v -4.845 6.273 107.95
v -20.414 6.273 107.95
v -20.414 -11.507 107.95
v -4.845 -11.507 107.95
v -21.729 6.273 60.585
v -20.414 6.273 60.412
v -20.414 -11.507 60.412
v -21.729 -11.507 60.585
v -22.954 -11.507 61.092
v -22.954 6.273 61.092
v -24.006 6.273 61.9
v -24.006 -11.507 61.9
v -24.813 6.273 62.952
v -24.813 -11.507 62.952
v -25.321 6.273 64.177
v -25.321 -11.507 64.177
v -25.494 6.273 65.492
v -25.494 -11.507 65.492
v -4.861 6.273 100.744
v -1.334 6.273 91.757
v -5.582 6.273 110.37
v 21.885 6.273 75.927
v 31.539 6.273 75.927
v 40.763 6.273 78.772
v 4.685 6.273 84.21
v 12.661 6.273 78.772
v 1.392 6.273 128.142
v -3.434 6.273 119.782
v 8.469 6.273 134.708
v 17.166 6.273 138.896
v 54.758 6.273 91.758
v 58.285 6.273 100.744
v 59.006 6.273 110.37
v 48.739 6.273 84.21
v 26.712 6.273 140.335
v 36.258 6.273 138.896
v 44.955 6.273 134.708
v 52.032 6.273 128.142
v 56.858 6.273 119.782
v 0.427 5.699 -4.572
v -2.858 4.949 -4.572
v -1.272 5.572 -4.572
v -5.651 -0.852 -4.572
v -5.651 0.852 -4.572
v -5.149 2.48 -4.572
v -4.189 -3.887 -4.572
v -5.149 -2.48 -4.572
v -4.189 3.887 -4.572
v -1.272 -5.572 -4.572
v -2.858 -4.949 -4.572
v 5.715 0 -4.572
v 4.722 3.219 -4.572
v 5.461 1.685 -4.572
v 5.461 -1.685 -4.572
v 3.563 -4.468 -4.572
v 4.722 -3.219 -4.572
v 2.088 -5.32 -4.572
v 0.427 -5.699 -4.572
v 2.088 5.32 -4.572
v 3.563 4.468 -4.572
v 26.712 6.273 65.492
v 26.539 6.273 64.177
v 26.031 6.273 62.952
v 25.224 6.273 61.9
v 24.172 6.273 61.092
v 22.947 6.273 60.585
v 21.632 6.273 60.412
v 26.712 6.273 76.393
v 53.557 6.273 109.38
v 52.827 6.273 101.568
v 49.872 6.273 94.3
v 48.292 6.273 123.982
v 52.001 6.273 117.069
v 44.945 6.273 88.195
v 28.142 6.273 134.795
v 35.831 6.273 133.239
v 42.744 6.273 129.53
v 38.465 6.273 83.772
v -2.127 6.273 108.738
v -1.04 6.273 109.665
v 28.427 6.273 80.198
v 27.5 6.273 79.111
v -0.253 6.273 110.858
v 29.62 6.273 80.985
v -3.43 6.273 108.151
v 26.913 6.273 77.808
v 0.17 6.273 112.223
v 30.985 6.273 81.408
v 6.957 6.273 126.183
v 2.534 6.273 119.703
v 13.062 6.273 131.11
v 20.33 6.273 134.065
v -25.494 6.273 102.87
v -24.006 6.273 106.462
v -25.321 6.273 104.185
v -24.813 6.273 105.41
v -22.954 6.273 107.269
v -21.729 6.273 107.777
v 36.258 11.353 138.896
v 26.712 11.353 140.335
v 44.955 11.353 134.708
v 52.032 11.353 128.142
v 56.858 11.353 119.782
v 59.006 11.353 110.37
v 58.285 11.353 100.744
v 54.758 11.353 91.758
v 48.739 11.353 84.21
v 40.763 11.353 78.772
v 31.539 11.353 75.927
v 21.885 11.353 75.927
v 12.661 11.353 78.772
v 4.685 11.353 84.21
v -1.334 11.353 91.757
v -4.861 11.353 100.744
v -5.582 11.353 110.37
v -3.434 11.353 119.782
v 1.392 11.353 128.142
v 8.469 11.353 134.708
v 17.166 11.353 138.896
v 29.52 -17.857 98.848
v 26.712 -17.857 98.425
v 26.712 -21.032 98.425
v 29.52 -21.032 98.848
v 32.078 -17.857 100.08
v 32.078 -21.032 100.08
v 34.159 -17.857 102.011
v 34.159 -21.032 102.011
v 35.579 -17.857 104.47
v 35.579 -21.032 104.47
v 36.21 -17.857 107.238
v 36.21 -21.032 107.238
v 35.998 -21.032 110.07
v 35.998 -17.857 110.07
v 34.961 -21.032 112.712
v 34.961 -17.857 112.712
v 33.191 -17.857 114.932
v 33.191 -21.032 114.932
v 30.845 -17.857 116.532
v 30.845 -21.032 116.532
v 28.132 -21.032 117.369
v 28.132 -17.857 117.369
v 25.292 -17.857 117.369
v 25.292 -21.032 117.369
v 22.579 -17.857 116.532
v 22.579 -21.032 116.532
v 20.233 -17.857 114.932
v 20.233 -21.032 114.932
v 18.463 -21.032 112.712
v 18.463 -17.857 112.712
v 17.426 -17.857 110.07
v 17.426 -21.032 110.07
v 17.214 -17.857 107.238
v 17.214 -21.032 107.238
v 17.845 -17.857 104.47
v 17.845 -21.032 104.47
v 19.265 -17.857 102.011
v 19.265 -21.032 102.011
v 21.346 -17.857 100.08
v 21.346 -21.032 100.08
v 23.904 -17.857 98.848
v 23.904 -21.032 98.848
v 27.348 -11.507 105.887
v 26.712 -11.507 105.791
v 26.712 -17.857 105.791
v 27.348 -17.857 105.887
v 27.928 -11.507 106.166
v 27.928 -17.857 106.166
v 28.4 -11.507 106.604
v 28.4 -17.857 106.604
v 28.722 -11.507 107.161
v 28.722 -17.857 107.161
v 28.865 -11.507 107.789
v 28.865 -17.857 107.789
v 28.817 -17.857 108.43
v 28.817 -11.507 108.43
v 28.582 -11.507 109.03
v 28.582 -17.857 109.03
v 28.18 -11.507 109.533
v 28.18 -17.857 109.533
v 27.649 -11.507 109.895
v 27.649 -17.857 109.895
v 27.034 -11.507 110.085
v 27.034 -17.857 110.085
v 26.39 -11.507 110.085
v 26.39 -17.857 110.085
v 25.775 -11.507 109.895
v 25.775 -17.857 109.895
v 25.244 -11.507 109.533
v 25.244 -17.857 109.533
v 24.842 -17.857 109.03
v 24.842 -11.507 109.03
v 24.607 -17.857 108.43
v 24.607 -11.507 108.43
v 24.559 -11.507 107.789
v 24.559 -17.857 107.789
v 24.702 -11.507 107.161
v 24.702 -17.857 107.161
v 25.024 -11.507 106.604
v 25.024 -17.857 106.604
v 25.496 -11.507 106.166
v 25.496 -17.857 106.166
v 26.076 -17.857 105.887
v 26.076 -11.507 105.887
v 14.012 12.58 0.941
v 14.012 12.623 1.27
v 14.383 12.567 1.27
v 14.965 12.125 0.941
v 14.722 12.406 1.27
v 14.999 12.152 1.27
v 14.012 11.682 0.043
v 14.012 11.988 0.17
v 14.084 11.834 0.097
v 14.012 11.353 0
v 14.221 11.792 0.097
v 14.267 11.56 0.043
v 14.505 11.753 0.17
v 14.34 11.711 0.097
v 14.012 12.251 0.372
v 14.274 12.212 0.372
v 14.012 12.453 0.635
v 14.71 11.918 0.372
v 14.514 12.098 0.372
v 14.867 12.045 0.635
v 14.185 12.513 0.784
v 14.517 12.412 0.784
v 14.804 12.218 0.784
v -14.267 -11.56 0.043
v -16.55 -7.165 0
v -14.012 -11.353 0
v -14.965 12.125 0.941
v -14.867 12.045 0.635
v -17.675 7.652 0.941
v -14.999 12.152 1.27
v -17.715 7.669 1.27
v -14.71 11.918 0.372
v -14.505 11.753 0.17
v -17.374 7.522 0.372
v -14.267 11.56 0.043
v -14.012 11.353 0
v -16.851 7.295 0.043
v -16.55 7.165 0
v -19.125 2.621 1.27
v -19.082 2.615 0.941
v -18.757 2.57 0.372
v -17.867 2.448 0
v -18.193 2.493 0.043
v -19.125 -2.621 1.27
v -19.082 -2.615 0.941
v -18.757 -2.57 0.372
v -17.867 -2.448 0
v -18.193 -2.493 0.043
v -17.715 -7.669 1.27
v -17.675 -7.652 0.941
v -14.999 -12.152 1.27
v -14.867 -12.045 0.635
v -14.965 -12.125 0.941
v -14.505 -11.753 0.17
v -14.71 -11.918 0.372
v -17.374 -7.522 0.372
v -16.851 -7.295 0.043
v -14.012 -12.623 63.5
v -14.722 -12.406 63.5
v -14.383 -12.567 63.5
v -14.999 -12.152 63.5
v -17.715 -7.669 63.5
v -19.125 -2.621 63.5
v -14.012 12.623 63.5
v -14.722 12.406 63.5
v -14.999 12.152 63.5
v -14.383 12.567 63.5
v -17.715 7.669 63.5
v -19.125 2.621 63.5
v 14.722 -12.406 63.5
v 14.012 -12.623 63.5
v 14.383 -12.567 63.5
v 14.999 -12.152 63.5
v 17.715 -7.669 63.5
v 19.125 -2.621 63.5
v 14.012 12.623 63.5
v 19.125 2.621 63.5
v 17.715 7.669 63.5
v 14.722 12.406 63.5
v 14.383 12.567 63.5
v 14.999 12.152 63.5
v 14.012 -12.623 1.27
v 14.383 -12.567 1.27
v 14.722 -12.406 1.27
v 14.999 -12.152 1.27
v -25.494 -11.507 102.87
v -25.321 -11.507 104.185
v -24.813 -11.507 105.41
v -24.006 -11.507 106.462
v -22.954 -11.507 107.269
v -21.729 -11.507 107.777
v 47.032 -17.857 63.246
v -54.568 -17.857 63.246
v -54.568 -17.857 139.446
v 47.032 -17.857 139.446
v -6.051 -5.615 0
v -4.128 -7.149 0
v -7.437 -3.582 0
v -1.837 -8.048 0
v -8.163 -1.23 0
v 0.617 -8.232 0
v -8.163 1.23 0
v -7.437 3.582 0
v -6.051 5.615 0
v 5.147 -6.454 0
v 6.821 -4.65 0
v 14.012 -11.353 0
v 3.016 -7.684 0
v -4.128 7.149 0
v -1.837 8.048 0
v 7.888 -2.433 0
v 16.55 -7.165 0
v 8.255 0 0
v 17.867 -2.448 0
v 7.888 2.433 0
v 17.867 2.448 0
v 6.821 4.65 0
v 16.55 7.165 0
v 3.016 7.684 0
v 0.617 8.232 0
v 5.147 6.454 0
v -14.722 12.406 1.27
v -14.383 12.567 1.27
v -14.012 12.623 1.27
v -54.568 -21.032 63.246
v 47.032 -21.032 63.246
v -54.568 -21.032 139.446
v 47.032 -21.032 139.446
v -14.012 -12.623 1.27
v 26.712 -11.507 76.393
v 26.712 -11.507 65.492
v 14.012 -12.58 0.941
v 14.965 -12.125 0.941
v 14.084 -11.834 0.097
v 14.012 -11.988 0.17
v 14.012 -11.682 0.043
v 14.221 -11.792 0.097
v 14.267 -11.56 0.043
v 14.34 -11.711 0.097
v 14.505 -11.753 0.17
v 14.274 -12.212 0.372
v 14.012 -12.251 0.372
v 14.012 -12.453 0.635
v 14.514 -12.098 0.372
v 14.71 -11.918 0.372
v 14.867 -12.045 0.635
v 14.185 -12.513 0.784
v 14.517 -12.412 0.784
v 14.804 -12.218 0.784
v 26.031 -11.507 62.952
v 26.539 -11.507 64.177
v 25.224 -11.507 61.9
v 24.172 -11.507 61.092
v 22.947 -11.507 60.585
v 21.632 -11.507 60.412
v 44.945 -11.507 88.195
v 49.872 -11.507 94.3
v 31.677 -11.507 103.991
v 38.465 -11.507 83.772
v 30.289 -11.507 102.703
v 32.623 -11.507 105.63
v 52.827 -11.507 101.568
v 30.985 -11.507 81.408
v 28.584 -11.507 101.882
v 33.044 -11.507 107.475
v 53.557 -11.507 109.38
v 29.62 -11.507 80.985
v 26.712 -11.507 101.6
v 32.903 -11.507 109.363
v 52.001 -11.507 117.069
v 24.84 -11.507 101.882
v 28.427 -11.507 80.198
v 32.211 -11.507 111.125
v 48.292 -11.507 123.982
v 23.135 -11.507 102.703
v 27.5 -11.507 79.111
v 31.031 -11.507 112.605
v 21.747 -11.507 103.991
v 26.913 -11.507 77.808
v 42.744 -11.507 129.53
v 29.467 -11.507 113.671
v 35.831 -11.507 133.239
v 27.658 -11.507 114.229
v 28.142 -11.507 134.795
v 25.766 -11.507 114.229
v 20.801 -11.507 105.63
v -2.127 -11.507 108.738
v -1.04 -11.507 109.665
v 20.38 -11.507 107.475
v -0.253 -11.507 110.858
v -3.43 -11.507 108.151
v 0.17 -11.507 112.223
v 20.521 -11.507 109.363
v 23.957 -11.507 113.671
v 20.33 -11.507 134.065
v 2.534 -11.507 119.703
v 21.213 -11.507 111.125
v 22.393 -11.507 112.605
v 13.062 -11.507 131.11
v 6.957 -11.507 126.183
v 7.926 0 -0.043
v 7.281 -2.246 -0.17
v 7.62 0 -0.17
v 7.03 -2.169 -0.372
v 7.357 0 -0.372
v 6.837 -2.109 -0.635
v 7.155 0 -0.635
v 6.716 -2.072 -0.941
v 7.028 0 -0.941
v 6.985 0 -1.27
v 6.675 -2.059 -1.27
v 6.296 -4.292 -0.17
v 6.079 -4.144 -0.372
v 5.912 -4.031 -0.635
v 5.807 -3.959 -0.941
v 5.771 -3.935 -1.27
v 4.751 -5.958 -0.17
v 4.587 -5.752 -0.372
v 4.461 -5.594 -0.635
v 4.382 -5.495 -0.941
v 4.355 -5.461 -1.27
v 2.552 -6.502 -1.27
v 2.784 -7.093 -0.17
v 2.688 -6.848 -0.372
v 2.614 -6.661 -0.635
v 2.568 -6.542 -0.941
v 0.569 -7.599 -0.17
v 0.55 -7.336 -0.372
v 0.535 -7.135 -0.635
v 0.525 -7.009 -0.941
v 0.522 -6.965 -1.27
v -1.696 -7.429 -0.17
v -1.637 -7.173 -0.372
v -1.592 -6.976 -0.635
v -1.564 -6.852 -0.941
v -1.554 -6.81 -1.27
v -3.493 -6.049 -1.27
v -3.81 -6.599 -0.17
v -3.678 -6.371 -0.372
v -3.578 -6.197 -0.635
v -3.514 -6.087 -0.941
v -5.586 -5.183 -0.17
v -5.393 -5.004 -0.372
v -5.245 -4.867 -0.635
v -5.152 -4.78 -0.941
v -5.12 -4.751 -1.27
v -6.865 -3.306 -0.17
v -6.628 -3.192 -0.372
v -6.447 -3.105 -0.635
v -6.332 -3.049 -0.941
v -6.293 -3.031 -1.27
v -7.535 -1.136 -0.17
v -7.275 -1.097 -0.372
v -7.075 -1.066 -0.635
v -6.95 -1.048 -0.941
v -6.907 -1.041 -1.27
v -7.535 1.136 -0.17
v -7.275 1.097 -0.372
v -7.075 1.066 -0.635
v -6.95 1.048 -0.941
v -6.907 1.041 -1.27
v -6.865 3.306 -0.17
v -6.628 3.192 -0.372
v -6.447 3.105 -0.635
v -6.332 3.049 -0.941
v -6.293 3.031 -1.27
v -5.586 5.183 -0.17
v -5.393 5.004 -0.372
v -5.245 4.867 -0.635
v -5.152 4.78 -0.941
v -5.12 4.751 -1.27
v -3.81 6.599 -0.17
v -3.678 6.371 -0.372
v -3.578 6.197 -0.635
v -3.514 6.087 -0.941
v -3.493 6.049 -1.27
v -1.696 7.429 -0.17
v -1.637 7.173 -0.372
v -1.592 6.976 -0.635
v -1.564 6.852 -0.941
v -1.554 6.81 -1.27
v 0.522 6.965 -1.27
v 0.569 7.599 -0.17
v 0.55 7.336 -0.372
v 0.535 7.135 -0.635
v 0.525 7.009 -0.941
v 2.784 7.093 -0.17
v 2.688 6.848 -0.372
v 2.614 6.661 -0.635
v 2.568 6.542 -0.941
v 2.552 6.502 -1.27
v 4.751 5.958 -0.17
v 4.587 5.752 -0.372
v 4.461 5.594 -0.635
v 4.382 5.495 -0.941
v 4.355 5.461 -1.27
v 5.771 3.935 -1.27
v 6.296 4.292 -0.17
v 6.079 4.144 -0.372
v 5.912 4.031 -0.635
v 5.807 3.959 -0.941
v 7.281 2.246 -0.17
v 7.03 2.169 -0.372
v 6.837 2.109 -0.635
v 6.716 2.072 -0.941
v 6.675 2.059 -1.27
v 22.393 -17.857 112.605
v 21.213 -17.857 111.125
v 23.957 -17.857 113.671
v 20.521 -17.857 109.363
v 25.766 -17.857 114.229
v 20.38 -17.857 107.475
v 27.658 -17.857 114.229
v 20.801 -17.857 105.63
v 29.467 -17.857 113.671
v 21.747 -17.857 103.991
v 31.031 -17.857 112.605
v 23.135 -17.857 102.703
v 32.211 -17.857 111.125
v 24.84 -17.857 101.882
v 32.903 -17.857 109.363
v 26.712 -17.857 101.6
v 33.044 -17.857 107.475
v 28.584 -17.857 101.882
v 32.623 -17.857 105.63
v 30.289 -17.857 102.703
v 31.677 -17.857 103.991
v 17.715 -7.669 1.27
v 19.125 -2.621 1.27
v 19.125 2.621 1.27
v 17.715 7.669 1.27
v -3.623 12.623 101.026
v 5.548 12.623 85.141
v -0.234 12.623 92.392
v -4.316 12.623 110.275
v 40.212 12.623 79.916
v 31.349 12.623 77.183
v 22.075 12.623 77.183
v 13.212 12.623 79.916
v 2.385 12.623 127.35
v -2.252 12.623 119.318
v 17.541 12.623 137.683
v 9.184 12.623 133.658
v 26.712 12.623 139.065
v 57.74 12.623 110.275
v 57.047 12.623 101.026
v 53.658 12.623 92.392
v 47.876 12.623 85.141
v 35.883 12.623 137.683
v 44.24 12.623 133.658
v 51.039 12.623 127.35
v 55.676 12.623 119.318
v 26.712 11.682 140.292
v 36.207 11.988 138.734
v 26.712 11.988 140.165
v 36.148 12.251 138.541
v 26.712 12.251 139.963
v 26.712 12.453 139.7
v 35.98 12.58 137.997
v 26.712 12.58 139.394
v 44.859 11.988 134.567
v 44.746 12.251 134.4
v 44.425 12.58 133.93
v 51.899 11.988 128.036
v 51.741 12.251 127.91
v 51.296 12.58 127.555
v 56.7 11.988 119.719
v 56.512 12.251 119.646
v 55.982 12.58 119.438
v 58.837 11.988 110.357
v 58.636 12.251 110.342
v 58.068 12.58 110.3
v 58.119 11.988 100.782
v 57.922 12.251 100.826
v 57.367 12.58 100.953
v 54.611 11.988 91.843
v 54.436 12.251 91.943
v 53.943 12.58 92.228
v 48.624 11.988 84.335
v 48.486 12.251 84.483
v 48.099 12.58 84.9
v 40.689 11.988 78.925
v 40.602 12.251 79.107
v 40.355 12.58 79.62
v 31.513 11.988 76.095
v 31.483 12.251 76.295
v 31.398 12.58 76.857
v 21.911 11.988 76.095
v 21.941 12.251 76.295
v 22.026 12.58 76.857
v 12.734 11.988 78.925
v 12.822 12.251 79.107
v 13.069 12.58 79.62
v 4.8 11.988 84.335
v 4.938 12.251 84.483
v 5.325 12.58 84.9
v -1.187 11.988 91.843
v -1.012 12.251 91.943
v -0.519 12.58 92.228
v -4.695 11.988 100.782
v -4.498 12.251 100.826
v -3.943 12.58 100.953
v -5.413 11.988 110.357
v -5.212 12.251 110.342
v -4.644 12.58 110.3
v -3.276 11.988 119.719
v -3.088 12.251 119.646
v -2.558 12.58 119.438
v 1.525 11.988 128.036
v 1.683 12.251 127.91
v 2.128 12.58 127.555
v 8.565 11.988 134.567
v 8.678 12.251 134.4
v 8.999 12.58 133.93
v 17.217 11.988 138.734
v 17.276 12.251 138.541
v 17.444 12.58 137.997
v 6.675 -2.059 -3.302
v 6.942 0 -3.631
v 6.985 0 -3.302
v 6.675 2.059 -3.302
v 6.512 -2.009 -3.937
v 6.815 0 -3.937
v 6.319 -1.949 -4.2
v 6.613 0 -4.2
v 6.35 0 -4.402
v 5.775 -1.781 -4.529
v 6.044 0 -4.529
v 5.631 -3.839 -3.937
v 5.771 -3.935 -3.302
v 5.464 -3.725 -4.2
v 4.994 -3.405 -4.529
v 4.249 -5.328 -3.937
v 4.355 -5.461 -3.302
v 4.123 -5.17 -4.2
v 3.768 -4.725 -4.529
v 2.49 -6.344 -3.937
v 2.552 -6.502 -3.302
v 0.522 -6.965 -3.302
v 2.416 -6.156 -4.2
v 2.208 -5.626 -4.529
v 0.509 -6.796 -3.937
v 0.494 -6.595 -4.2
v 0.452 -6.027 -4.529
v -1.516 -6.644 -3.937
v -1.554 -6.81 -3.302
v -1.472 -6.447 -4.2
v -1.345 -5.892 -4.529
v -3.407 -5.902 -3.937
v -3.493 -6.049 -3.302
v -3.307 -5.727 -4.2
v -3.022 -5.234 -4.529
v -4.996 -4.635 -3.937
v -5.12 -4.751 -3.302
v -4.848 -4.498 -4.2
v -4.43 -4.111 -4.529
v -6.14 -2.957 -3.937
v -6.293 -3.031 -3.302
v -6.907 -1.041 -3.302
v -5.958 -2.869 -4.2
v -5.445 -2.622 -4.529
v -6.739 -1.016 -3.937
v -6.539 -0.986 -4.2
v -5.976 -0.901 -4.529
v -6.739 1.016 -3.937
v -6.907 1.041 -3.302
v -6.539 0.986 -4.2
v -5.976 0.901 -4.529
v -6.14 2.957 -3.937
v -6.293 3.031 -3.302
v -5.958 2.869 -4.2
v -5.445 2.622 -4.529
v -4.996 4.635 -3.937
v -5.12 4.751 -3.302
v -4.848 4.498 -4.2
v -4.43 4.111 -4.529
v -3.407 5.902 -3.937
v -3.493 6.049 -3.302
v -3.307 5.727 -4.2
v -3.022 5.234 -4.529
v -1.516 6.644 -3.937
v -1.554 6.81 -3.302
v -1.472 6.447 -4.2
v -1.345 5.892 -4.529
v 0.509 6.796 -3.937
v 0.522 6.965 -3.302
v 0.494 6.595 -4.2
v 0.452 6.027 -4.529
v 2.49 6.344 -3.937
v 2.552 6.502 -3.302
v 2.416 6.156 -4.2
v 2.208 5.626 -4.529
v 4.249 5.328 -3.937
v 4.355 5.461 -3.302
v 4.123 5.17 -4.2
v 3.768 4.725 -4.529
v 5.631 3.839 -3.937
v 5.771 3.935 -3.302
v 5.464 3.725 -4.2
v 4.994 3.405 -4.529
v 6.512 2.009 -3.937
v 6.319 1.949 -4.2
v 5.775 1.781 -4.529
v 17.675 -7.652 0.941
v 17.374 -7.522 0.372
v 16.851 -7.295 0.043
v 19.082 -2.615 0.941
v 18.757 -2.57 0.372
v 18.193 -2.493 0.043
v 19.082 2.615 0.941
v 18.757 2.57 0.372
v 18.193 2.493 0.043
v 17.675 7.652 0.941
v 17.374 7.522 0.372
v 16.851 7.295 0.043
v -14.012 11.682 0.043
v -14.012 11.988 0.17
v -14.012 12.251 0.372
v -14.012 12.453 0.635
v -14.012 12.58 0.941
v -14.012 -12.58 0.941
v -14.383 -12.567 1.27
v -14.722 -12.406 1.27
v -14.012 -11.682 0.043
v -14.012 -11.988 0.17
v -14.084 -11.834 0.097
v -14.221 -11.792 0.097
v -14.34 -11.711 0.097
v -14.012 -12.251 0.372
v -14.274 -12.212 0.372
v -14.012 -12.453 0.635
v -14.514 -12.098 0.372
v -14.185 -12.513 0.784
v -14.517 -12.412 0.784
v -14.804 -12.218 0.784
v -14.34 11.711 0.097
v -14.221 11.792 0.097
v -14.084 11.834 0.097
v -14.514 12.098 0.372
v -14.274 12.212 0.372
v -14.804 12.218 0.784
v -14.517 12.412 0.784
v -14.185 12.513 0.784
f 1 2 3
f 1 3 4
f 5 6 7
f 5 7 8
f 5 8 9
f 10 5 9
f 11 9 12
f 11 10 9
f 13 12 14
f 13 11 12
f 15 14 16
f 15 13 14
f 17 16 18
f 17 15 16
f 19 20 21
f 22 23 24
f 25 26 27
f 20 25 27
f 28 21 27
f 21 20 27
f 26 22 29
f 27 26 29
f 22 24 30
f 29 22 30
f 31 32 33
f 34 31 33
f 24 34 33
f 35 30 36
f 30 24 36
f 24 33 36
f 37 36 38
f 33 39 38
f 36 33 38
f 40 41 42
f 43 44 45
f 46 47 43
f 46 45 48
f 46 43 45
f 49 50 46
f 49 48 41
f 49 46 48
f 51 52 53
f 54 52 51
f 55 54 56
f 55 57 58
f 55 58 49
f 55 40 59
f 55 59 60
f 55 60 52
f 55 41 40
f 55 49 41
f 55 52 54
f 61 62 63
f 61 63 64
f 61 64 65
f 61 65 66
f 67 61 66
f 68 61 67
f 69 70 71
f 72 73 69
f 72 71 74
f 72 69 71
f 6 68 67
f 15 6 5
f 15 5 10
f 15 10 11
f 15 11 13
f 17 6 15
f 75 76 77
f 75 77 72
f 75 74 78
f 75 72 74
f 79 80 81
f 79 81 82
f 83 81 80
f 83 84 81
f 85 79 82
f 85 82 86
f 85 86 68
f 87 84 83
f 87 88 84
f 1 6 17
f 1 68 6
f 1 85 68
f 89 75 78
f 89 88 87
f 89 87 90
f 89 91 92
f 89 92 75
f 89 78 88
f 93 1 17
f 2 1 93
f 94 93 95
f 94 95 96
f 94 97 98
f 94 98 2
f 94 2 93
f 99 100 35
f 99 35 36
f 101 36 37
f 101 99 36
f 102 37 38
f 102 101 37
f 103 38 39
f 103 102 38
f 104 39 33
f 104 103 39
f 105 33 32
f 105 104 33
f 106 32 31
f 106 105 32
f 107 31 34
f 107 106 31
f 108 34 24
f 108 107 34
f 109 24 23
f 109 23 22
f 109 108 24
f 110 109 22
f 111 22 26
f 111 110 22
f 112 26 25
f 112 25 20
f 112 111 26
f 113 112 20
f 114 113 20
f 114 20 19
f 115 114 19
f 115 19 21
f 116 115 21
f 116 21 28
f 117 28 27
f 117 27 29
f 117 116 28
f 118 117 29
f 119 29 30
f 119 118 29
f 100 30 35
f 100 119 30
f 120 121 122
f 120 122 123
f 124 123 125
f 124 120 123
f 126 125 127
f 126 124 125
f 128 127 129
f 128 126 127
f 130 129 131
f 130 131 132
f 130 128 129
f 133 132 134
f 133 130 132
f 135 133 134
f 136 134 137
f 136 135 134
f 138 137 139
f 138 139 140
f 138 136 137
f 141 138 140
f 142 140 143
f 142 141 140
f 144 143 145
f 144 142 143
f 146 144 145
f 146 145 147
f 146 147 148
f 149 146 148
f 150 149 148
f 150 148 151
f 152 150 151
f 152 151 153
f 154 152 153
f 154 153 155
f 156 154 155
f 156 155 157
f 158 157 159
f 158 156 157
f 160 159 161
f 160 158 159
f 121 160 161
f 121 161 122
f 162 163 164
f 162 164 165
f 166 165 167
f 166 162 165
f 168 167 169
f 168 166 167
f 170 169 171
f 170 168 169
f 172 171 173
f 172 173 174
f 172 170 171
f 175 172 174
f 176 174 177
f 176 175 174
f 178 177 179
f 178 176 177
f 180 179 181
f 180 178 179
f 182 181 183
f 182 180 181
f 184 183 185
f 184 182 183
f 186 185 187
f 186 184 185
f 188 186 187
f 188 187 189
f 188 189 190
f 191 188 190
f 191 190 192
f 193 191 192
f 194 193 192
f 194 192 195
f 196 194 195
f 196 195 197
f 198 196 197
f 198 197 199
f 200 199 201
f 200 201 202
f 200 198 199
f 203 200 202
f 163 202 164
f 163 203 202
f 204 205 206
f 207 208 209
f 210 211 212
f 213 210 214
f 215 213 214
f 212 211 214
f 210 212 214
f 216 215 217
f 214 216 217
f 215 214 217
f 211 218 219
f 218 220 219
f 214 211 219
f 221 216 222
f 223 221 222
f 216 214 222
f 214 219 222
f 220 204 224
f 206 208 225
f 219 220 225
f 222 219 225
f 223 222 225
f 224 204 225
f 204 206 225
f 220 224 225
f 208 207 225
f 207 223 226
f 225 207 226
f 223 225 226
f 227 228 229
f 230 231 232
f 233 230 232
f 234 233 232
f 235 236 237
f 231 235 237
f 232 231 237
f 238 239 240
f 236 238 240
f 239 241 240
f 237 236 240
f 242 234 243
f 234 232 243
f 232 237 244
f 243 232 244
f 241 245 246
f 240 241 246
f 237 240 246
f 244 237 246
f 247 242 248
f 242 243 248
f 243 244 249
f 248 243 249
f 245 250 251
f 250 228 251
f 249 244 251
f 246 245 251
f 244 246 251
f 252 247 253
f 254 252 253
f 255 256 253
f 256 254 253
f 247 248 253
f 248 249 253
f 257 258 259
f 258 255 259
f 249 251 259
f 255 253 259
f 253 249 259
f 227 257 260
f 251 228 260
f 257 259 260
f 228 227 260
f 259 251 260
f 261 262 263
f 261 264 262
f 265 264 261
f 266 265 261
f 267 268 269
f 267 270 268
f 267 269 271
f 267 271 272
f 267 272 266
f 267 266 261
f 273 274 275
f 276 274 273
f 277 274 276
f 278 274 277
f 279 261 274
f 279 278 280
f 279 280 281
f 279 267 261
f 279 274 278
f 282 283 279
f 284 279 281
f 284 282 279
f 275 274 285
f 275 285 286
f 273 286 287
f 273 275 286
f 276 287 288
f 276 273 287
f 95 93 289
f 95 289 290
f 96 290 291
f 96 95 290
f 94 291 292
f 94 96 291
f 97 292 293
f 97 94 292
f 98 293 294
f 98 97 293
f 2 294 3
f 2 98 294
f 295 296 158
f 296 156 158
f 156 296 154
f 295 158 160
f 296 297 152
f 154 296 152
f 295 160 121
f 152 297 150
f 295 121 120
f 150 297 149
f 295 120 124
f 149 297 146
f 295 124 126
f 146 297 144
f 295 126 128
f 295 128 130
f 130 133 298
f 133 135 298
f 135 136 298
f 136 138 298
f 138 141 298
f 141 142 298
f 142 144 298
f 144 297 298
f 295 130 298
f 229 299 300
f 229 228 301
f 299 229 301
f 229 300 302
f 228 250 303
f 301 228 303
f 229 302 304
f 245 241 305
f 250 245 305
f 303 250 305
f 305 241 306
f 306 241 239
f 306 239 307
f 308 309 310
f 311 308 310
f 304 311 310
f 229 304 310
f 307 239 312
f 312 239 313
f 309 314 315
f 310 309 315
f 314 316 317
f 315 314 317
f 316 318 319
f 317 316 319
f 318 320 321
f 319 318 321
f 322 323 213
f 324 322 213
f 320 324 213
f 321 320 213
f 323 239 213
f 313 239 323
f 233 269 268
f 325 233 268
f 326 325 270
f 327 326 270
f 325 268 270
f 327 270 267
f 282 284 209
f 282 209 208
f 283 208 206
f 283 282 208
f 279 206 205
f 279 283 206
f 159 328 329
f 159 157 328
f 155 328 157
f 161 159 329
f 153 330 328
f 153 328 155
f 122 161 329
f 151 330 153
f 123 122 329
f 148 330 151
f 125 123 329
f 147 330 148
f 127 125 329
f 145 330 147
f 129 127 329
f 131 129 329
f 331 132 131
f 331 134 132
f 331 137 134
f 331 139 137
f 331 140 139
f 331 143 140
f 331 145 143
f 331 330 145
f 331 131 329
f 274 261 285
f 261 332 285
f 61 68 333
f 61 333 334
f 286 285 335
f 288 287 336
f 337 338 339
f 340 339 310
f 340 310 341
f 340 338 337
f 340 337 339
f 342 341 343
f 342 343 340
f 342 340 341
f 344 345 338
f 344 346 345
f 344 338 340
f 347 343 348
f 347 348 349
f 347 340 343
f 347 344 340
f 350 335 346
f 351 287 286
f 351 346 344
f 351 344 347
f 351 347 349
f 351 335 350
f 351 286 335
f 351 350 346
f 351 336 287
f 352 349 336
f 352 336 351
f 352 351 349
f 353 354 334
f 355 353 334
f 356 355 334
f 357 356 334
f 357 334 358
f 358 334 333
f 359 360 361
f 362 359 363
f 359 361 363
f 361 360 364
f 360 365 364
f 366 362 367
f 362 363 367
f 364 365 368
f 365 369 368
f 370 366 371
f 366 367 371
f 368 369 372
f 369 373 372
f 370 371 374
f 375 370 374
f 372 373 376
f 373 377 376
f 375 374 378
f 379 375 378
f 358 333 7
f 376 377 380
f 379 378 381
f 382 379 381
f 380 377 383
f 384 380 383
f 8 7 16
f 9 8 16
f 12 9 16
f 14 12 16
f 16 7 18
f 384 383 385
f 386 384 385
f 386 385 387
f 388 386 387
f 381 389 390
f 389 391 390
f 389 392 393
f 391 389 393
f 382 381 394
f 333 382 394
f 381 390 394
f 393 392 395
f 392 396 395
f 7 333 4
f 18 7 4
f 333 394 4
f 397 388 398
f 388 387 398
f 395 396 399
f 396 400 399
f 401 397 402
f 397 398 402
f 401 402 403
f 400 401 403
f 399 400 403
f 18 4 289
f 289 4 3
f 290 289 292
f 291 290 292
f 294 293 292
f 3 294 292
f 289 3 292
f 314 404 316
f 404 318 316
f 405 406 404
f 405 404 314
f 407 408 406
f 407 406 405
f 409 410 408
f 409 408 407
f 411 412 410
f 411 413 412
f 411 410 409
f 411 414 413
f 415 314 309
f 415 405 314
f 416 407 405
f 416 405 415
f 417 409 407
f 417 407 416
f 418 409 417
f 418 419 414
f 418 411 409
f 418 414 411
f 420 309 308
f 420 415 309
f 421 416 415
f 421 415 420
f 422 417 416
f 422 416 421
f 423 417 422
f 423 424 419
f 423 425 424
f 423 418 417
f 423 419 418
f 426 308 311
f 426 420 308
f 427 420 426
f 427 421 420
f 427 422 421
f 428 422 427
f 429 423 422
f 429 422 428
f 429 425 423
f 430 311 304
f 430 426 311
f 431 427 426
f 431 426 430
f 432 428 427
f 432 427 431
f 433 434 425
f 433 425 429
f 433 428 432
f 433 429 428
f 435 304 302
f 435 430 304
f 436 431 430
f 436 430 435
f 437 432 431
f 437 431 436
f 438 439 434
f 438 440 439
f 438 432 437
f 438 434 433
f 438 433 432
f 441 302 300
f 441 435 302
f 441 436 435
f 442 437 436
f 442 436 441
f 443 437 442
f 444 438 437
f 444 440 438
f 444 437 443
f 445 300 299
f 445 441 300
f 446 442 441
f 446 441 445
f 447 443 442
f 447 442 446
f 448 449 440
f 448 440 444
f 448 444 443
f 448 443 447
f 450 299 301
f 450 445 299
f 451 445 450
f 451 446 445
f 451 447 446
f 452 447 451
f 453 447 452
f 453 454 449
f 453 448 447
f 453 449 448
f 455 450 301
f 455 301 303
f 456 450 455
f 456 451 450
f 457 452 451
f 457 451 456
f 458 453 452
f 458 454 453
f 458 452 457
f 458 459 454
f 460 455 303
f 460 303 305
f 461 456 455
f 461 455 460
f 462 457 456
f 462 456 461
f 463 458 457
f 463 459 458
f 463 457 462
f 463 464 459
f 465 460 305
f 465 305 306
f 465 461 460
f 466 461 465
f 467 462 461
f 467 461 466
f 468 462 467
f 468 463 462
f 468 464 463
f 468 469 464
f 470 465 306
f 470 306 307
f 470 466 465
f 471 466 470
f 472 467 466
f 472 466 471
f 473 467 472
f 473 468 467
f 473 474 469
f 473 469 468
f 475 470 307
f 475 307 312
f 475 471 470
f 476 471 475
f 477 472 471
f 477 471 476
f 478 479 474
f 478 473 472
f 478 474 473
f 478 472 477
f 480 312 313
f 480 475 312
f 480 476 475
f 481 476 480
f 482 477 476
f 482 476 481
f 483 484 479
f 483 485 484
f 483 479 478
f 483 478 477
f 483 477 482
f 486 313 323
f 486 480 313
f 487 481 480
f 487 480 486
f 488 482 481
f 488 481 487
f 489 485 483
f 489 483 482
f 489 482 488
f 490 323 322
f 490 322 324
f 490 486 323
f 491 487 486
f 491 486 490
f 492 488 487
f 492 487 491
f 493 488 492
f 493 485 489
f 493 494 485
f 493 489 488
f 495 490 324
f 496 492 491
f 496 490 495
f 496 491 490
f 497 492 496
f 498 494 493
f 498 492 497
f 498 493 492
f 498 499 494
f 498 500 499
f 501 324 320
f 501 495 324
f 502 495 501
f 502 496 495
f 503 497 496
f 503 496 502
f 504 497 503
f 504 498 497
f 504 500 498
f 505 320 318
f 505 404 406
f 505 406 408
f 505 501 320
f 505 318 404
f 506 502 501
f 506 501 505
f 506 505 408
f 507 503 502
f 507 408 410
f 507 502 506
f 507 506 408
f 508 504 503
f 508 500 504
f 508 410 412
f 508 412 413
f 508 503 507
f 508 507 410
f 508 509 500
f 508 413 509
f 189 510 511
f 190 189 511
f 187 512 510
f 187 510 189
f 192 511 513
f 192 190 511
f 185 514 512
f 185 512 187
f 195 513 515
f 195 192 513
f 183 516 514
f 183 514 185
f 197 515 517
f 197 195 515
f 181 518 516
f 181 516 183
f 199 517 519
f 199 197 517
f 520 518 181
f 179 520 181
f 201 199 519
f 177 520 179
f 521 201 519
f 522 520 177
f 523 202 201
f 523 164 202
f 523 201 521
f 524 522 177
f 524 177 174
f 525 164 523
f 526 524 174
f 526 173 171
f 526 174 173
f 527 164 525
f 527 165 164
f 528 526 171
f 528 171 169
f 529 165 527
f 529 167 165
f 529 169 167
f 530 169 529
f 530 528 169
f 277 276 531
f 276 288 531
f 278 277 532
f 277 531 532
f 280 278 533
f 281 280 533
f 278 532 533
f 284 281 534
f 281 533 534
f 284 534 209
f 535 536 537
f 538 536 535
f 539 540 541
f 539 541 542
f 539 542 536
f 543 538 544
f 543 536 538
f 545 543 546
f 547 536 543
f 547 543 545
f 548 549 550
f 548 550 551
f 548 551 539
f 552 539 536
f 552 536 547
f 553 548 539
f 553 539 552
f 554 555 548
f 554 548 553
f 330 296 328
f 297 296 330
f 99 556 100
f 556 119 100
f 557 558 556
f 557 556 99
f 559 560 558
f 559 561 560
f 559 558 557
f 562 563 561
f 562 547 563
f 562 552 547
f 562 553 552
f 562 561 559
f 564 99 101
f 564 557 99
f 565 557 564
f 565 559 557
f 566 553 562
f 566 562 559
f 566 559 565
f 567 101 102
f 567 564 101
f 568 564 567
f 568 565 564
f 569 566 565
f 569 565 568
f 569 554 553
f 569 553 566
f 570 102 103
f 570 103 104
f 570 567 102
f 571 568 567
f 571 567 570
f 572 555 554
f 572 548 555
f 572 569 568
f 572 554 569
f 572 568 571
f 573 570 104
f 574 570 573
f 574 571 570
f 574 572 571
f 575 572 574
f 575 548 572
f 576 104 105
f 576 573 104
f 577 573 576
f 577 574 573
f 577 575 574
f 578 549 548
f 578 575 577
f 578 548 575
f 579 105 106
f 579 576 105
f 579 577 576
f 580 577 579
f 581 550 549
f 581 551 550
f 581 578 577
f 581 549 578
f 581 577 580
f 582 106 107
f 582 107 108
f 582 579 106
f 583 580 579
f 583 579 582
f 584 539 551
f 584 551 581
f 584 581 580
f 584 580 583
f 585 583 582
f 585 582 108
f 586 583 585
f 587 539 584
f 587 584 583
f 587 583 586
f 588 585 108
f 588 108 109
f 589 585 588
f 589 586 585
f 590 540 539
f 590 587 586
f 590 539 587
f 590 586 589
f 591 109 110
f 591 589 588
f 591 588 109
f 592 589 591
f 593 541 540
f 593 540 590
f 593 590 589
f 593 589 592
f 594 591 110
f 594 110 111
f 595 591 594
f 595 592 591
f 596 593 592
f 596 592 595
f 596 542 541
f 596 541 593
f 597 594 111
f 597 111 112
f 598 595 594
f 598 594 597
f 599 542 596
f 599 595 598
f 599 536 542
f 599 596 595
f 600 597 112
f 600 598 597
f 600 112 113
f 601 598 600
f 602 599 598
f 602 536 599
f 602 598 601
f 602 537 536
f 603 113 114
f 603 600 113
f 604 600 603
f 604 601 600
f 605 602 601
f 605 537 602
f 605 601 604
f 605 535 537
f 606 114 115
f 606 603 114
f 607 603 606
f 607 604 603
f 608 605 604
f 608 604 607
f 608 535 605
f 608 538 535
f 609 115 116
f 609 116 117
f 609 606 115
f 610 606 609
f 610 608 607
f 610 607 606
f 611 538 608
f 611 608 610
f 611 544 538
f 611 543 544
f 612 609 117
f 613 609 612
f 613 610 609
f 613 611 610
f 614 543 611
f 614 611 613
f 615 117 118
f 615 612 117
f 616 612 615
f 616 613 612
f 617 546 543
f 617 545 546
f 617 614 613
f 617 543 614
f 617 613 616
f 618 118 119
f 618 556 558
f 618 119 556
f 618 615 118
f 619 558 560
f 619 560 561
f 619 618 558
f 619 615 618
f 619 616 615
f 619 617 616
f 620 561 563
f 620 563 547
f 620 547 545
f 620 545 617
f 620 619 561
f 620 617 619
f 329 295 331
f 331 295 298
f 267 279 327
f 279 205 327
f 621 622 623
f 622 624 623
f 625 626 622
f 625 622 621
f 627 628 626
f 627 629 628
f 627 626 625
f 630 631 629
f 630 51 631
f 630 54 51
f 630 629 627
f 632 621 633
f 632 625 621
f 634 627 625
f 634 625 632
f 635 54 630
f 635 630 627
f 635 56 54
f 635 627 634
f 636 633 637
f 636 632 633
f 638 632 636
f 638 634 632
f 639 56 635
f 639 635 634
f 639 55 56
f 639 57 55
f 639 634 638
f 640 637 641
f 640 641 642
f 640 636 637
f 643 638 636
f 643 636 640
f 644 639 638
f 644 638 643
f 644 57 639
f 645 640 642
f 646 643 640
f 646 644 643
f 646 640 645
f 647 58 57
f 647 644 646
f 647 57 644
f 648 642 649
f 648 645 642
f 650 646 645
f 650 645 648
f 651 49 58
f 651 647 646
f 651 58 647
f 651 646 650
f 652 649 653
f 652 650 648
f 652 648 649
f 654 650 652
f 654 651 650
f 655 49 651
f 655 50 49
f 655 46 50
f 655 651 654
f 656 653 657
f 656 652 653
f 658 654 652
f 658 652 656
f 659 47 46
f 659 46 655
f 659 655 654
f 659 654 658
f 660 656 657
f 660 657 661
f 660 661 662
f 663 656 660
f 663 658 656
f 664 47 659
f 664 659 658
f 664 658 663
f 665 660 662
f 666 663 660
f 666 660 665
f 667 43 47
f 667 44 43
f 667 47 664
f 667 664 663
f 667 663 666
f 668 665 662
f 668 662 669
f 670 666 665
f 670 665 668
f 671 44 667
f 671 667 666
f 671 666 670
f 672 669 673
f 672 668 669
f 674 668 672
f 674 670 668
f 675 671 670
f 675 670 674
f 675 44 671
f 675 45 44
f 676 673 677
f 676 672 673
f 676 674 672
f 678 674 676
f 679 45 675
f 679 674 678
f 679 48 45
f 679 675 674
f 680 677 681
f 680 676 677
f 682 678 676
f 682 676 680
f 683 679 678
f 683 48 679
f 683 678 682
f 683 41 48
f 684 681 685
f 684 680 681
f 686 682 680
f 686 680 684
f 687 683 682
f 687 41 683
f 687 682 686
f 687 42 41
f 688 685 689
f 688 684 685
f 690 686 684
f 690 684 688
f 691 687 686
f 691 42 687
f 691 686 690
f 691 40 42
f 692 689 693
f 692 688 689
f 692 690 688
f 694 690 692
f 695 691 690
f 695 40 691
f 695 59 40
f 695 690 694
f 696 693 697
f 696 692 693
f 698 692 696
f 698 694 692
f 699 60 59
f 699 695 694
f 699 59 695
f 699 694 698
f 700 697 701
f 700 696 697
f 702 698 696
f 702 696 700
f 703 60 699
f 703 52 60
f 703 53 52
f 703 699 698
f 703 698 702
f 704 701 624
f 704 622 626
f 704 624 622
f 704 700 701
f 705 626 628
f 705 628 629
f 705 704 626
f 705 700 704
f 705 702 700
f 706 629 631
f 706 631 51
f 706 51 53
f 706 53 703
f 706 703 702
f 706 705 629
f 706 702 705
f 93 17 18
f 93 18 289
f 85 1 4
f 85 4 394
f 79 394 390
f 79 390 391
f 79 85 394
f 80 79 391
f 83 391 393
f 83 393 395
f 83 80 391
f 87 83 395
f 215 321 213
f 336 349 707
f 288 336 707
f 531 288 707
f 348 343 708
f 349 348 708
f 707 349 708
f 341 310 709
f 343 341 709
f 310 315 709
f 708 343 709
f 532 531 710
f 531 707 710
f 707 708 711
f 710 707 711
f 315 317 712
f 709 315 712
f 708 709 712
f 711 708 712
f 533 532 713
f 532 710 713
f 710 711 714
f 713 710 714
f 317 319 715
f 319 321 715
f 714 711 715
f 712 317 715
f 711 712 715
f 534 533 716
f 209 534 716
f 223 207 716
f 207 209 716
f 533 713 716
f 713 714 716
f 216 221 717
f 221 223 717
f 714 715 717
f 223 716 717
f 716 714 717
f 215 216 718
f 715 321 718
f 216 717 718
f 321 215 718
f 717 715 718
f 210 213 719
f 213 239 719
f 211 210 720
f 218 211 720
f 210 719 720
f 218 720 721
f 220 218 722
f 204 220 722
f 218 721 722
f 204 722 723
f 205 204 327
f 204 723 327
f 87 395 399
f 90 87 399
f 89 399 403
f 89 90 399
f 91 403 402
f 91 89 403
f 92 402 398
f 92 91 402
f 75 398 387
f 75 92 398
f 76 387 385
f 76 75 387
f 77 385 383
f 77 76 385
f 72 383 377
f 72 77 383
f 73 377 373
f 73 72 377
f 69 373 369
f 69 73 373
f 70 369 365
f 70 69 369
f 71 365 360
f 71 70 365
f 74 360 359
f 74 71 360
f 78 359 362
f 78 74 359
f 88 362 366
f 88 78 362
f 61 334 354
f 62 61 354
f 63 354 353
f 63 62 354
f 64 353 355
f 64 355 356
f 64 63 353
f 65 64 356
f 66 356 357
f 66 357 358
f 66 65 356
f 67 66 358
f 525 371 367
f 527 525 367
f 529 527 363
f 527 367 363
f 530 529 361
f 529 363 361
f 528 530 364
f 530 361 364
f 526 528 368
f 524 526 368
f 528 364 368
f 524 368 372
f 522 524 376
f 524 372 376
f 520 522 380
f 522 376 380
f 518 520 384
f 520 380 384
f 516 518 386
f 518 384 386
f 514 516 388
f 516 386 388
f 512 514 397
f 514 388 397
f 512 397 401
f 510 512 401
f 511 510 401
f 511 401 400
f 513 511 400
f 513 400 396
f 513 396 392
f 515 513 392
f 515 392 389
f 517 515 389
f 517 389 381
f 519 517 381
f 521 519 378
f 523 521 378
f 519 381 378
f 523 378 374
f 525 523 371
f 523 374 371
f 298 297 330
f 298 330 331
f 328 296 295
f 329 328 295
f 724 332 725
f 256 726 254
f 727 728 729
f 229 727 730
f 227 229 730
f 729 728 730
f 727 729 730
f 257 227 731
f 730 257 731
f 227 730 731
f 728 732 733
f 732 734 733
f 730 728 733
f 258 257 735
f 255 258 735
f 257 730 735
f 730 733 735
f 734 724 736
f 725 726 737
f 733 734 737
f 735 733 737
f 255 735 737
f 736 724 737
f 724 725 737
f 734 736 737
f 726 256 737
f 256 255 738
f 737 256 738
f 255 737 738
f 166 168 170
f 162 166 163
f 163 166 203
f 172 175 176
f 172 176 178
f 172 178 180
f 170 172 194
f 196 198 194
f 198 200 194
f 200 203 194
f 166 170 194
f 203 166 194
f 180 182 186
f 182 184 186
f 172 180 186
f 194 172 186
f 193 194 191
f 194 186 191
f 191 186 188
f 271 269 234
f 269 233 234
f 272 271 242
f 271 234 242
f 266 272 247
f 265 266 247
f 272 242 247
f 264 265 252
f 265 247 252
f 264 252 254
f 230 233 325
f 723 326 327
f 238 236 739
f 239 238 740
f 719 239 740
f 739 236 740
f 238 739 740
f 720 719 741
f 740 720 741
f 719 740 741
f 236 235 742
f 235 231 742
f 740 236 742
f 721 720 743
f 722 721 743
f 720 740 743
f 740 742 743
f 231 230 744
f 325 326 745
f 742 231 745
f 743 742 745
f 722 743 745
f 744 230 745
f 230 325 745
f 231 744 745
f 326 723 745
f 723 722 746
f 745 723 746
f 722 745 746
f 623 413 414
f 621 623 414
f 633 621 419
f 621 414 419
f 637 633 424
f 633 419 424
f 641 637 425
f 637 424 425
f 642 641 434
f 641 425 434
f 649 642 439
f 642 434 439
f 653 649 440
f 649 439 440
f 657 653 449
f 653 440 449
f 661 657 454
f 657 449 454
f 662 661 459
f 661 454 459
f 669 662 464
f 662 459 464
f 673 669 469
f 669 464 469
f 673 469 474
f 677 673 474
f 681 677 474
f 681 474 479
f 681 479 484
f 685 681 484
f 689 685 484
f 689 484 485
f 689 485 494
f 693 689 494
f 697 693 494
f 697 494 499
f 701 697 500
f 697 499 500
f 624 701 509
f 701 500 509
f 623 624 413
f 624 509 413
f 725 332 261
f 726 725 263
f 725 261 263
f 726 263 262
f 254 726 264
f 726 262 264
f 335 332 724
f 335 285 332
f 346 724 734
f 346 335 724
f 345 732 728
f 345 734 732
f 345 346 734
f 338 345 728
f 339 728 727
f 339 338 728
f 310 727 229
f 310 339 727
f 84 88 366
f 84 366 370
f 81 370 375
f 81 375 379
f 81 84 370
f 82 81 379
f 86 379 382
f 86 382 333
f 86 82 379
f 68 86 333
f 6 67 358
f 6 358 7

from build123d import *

# Parameters (mm, degrees)
BOSS_EXTRUDE1_DEPTH = 63.5
SKETCH2_R           = 6.985
BOSS_EXTRUDE2_DEPTH = 4.572
FILLET1_R           = 1.27
SKETCH3_R           = 32.385
BOSS_EXTRUDE3_DEPTH = 6.35
BOSS_EXTRUDE4_DEPTH = 17.78
FILLET2_R           = 1.27
SKETCH5_R           = 6.35
SKETCH5_R_2         = 2.159
BOSS_EXTRUDE5_DEPTH = 6.35
SKETCH6_W           = 101.6
SKETCH6_H           = 76.2
SKETCH6_R           = 9.525
BOSS_EXTRUDE6_DEPTH = 3.175


with BuildPart() as part:
    # Sketch1 → Boss-Extrude1 (new body)
    with BuildSketch(Plane.XY):
        with BuildLine():
            Line((-14.605, -12.622931157), (14.605, -12.622931157))
            ThreePointArc((14.605, -12.622931157), (19.304, 0), (14.605, 12.622931157))
            Line((14.605, 12.622931157), (-14.605, 12.622931157))
            ThreePointArc((-14.605, 12.622931157), (-19.304, 0), (-14.605, -12.622931157))
        make_face()
    extrude(amount=BOSS_EXTRUDE1_DEPTH)

    # Sketch2 → Boss-Extrude2 (add)
    with BuildSketch(Plane(origin=(0, 0, 0), x_dir=(-1, 0, 0), z_dir=(0, 0, -1))):
        with Locations(Location((0, 0, 0), (0, 0, 180))):
            Circle(SKETCH2_R)
    extrude(amount=BOSS_EXTRUDE2_DEPTH)

    # Fillet1
    fillet1_edges = [part.edges().sort_by_distance(p)[0] for p in [
        (-6.985, 0, 0),
        (-6.985, 0, -4.572),
        (0, -12.622931157, 0),
        (-19.304, 0, 0),
        (0, 12.622931157, 0),
        (19.304, 0, 0),
        (14.605, -12.622931157, 31.75),
        (-14.605, -12.622931157, 31.75),
        (-14.605, 12.622931157, 31.75),
        (14.605, 12.622931157, 31.75),
    ]]
    fillet(fillet1_edges, radius=FILLET1_R)


with BuildPart() as body_2:
    # Sketch3 → Boss-Extrude3 (new body)
    with BuildSketch(Plane(origin=(0, 12.622931157, 0), x_dir=(1, 0, 0), z_dir=(0, 1, 0))):
        with Locations(Location((26.711998792, -107.95, 0), (0, 0, 270))):
            Circle(SKETCH3_R)
    extrude(amount=-BOSS_EXTRUDE3_DEPTH)

    # Fillet2
    fillet2_edges = [body_2.edges().sort_by_distance(p)[0] for p in [
        (26.711998792, 12.622931157, 75.565),
    ]]
    fillet(fillet2_edges, radius=FILLET2_R)


with BuildPart() as body_3:
    # Sketch4 → Boss-Extrude4 (new body)
    with BuildSketch(Plane.XZ.offset(-6.272931157)):
        with BuildLine():
            Line((26.711998792, 76.392999826), (26.711998792, 65.491798589))
            ThreePointArc((26.711998792, 65.491798589), (25.22410124, 61.89969614), (21.631998792, 60.411798589))
            Line((21.631998792, 60.411798589), (13.553296581, 60.411798589))
            Line((13.553296581, 60.411798589), (-20.414066966, 60.411798589))
            ThreePointArc((-20.414066966, 60.411798589), (-24.006169415, 61.89969614), (-25.494066966, 65.491798589))
            Line((-25.494066966, 65.491798589), (-25.494066966, 102.87))
            ThreePointArc((-25.494066966, 102.87), (-24.006169415, 106.462102448), (-20.414066966, 107.95))
            Line((-20.414066966, 107.95), (-4.845001382, 107.95))
            ThreePointArc((-4.845001382, 107.95), (-1.55069369, 109.162967956), (0.170429094, 112.222623295))
            ThreePointArc((0.170429094, 112.222623295), (45.721341651, 126.959342859), (30.984622087, 81.408430302))
            ThreePointArc((30.984622087, 81.408430302), (27.924966748, 79.687307518), (26.711998792, 76.392999826))
        make_face()
    extrude(amount=BOSS_EXTRUDE4_DEPTH)

    # Sketch5 → Boss-Extrude5 (add)
    with BuildSketch(Plane.XZ.offset(11.507068843)):
        with Locations(Location((26.711998792, 107.95, 0), (0, 0, 270))):
            Circle(SKETCH5_R)
        with Locations(Location((26.711998792, 107.95, 0), (0, 0, 270))):
            Circle(SKETCH5_R_2, mode=Mode.SUBTRACT)
    extrude(amount=BOSS_EXTRUDE5_DEPTH)


with BuildPart() as body_4:
    # Sketch6 → Boss-Extrude6 (new body)
    with BuildSketch(Plane.XZ.offset(17.857068843)):
        with Locations((-3.768001208, 101.345900449)):
            Rectangle(SKETCH6_W, SKETCH6_H)
        with Locations(Location((26.711998792, 107.95, 0), (0, 0, 270))):
            Circle(SKETCH6_R, mode=Mode.SUBTRACT)
    extrude(amount=BOSS_EXTRUDE6_DEPTH)


solid = Compound([part.part, body_2.part, body_3.part, body_4.part])
